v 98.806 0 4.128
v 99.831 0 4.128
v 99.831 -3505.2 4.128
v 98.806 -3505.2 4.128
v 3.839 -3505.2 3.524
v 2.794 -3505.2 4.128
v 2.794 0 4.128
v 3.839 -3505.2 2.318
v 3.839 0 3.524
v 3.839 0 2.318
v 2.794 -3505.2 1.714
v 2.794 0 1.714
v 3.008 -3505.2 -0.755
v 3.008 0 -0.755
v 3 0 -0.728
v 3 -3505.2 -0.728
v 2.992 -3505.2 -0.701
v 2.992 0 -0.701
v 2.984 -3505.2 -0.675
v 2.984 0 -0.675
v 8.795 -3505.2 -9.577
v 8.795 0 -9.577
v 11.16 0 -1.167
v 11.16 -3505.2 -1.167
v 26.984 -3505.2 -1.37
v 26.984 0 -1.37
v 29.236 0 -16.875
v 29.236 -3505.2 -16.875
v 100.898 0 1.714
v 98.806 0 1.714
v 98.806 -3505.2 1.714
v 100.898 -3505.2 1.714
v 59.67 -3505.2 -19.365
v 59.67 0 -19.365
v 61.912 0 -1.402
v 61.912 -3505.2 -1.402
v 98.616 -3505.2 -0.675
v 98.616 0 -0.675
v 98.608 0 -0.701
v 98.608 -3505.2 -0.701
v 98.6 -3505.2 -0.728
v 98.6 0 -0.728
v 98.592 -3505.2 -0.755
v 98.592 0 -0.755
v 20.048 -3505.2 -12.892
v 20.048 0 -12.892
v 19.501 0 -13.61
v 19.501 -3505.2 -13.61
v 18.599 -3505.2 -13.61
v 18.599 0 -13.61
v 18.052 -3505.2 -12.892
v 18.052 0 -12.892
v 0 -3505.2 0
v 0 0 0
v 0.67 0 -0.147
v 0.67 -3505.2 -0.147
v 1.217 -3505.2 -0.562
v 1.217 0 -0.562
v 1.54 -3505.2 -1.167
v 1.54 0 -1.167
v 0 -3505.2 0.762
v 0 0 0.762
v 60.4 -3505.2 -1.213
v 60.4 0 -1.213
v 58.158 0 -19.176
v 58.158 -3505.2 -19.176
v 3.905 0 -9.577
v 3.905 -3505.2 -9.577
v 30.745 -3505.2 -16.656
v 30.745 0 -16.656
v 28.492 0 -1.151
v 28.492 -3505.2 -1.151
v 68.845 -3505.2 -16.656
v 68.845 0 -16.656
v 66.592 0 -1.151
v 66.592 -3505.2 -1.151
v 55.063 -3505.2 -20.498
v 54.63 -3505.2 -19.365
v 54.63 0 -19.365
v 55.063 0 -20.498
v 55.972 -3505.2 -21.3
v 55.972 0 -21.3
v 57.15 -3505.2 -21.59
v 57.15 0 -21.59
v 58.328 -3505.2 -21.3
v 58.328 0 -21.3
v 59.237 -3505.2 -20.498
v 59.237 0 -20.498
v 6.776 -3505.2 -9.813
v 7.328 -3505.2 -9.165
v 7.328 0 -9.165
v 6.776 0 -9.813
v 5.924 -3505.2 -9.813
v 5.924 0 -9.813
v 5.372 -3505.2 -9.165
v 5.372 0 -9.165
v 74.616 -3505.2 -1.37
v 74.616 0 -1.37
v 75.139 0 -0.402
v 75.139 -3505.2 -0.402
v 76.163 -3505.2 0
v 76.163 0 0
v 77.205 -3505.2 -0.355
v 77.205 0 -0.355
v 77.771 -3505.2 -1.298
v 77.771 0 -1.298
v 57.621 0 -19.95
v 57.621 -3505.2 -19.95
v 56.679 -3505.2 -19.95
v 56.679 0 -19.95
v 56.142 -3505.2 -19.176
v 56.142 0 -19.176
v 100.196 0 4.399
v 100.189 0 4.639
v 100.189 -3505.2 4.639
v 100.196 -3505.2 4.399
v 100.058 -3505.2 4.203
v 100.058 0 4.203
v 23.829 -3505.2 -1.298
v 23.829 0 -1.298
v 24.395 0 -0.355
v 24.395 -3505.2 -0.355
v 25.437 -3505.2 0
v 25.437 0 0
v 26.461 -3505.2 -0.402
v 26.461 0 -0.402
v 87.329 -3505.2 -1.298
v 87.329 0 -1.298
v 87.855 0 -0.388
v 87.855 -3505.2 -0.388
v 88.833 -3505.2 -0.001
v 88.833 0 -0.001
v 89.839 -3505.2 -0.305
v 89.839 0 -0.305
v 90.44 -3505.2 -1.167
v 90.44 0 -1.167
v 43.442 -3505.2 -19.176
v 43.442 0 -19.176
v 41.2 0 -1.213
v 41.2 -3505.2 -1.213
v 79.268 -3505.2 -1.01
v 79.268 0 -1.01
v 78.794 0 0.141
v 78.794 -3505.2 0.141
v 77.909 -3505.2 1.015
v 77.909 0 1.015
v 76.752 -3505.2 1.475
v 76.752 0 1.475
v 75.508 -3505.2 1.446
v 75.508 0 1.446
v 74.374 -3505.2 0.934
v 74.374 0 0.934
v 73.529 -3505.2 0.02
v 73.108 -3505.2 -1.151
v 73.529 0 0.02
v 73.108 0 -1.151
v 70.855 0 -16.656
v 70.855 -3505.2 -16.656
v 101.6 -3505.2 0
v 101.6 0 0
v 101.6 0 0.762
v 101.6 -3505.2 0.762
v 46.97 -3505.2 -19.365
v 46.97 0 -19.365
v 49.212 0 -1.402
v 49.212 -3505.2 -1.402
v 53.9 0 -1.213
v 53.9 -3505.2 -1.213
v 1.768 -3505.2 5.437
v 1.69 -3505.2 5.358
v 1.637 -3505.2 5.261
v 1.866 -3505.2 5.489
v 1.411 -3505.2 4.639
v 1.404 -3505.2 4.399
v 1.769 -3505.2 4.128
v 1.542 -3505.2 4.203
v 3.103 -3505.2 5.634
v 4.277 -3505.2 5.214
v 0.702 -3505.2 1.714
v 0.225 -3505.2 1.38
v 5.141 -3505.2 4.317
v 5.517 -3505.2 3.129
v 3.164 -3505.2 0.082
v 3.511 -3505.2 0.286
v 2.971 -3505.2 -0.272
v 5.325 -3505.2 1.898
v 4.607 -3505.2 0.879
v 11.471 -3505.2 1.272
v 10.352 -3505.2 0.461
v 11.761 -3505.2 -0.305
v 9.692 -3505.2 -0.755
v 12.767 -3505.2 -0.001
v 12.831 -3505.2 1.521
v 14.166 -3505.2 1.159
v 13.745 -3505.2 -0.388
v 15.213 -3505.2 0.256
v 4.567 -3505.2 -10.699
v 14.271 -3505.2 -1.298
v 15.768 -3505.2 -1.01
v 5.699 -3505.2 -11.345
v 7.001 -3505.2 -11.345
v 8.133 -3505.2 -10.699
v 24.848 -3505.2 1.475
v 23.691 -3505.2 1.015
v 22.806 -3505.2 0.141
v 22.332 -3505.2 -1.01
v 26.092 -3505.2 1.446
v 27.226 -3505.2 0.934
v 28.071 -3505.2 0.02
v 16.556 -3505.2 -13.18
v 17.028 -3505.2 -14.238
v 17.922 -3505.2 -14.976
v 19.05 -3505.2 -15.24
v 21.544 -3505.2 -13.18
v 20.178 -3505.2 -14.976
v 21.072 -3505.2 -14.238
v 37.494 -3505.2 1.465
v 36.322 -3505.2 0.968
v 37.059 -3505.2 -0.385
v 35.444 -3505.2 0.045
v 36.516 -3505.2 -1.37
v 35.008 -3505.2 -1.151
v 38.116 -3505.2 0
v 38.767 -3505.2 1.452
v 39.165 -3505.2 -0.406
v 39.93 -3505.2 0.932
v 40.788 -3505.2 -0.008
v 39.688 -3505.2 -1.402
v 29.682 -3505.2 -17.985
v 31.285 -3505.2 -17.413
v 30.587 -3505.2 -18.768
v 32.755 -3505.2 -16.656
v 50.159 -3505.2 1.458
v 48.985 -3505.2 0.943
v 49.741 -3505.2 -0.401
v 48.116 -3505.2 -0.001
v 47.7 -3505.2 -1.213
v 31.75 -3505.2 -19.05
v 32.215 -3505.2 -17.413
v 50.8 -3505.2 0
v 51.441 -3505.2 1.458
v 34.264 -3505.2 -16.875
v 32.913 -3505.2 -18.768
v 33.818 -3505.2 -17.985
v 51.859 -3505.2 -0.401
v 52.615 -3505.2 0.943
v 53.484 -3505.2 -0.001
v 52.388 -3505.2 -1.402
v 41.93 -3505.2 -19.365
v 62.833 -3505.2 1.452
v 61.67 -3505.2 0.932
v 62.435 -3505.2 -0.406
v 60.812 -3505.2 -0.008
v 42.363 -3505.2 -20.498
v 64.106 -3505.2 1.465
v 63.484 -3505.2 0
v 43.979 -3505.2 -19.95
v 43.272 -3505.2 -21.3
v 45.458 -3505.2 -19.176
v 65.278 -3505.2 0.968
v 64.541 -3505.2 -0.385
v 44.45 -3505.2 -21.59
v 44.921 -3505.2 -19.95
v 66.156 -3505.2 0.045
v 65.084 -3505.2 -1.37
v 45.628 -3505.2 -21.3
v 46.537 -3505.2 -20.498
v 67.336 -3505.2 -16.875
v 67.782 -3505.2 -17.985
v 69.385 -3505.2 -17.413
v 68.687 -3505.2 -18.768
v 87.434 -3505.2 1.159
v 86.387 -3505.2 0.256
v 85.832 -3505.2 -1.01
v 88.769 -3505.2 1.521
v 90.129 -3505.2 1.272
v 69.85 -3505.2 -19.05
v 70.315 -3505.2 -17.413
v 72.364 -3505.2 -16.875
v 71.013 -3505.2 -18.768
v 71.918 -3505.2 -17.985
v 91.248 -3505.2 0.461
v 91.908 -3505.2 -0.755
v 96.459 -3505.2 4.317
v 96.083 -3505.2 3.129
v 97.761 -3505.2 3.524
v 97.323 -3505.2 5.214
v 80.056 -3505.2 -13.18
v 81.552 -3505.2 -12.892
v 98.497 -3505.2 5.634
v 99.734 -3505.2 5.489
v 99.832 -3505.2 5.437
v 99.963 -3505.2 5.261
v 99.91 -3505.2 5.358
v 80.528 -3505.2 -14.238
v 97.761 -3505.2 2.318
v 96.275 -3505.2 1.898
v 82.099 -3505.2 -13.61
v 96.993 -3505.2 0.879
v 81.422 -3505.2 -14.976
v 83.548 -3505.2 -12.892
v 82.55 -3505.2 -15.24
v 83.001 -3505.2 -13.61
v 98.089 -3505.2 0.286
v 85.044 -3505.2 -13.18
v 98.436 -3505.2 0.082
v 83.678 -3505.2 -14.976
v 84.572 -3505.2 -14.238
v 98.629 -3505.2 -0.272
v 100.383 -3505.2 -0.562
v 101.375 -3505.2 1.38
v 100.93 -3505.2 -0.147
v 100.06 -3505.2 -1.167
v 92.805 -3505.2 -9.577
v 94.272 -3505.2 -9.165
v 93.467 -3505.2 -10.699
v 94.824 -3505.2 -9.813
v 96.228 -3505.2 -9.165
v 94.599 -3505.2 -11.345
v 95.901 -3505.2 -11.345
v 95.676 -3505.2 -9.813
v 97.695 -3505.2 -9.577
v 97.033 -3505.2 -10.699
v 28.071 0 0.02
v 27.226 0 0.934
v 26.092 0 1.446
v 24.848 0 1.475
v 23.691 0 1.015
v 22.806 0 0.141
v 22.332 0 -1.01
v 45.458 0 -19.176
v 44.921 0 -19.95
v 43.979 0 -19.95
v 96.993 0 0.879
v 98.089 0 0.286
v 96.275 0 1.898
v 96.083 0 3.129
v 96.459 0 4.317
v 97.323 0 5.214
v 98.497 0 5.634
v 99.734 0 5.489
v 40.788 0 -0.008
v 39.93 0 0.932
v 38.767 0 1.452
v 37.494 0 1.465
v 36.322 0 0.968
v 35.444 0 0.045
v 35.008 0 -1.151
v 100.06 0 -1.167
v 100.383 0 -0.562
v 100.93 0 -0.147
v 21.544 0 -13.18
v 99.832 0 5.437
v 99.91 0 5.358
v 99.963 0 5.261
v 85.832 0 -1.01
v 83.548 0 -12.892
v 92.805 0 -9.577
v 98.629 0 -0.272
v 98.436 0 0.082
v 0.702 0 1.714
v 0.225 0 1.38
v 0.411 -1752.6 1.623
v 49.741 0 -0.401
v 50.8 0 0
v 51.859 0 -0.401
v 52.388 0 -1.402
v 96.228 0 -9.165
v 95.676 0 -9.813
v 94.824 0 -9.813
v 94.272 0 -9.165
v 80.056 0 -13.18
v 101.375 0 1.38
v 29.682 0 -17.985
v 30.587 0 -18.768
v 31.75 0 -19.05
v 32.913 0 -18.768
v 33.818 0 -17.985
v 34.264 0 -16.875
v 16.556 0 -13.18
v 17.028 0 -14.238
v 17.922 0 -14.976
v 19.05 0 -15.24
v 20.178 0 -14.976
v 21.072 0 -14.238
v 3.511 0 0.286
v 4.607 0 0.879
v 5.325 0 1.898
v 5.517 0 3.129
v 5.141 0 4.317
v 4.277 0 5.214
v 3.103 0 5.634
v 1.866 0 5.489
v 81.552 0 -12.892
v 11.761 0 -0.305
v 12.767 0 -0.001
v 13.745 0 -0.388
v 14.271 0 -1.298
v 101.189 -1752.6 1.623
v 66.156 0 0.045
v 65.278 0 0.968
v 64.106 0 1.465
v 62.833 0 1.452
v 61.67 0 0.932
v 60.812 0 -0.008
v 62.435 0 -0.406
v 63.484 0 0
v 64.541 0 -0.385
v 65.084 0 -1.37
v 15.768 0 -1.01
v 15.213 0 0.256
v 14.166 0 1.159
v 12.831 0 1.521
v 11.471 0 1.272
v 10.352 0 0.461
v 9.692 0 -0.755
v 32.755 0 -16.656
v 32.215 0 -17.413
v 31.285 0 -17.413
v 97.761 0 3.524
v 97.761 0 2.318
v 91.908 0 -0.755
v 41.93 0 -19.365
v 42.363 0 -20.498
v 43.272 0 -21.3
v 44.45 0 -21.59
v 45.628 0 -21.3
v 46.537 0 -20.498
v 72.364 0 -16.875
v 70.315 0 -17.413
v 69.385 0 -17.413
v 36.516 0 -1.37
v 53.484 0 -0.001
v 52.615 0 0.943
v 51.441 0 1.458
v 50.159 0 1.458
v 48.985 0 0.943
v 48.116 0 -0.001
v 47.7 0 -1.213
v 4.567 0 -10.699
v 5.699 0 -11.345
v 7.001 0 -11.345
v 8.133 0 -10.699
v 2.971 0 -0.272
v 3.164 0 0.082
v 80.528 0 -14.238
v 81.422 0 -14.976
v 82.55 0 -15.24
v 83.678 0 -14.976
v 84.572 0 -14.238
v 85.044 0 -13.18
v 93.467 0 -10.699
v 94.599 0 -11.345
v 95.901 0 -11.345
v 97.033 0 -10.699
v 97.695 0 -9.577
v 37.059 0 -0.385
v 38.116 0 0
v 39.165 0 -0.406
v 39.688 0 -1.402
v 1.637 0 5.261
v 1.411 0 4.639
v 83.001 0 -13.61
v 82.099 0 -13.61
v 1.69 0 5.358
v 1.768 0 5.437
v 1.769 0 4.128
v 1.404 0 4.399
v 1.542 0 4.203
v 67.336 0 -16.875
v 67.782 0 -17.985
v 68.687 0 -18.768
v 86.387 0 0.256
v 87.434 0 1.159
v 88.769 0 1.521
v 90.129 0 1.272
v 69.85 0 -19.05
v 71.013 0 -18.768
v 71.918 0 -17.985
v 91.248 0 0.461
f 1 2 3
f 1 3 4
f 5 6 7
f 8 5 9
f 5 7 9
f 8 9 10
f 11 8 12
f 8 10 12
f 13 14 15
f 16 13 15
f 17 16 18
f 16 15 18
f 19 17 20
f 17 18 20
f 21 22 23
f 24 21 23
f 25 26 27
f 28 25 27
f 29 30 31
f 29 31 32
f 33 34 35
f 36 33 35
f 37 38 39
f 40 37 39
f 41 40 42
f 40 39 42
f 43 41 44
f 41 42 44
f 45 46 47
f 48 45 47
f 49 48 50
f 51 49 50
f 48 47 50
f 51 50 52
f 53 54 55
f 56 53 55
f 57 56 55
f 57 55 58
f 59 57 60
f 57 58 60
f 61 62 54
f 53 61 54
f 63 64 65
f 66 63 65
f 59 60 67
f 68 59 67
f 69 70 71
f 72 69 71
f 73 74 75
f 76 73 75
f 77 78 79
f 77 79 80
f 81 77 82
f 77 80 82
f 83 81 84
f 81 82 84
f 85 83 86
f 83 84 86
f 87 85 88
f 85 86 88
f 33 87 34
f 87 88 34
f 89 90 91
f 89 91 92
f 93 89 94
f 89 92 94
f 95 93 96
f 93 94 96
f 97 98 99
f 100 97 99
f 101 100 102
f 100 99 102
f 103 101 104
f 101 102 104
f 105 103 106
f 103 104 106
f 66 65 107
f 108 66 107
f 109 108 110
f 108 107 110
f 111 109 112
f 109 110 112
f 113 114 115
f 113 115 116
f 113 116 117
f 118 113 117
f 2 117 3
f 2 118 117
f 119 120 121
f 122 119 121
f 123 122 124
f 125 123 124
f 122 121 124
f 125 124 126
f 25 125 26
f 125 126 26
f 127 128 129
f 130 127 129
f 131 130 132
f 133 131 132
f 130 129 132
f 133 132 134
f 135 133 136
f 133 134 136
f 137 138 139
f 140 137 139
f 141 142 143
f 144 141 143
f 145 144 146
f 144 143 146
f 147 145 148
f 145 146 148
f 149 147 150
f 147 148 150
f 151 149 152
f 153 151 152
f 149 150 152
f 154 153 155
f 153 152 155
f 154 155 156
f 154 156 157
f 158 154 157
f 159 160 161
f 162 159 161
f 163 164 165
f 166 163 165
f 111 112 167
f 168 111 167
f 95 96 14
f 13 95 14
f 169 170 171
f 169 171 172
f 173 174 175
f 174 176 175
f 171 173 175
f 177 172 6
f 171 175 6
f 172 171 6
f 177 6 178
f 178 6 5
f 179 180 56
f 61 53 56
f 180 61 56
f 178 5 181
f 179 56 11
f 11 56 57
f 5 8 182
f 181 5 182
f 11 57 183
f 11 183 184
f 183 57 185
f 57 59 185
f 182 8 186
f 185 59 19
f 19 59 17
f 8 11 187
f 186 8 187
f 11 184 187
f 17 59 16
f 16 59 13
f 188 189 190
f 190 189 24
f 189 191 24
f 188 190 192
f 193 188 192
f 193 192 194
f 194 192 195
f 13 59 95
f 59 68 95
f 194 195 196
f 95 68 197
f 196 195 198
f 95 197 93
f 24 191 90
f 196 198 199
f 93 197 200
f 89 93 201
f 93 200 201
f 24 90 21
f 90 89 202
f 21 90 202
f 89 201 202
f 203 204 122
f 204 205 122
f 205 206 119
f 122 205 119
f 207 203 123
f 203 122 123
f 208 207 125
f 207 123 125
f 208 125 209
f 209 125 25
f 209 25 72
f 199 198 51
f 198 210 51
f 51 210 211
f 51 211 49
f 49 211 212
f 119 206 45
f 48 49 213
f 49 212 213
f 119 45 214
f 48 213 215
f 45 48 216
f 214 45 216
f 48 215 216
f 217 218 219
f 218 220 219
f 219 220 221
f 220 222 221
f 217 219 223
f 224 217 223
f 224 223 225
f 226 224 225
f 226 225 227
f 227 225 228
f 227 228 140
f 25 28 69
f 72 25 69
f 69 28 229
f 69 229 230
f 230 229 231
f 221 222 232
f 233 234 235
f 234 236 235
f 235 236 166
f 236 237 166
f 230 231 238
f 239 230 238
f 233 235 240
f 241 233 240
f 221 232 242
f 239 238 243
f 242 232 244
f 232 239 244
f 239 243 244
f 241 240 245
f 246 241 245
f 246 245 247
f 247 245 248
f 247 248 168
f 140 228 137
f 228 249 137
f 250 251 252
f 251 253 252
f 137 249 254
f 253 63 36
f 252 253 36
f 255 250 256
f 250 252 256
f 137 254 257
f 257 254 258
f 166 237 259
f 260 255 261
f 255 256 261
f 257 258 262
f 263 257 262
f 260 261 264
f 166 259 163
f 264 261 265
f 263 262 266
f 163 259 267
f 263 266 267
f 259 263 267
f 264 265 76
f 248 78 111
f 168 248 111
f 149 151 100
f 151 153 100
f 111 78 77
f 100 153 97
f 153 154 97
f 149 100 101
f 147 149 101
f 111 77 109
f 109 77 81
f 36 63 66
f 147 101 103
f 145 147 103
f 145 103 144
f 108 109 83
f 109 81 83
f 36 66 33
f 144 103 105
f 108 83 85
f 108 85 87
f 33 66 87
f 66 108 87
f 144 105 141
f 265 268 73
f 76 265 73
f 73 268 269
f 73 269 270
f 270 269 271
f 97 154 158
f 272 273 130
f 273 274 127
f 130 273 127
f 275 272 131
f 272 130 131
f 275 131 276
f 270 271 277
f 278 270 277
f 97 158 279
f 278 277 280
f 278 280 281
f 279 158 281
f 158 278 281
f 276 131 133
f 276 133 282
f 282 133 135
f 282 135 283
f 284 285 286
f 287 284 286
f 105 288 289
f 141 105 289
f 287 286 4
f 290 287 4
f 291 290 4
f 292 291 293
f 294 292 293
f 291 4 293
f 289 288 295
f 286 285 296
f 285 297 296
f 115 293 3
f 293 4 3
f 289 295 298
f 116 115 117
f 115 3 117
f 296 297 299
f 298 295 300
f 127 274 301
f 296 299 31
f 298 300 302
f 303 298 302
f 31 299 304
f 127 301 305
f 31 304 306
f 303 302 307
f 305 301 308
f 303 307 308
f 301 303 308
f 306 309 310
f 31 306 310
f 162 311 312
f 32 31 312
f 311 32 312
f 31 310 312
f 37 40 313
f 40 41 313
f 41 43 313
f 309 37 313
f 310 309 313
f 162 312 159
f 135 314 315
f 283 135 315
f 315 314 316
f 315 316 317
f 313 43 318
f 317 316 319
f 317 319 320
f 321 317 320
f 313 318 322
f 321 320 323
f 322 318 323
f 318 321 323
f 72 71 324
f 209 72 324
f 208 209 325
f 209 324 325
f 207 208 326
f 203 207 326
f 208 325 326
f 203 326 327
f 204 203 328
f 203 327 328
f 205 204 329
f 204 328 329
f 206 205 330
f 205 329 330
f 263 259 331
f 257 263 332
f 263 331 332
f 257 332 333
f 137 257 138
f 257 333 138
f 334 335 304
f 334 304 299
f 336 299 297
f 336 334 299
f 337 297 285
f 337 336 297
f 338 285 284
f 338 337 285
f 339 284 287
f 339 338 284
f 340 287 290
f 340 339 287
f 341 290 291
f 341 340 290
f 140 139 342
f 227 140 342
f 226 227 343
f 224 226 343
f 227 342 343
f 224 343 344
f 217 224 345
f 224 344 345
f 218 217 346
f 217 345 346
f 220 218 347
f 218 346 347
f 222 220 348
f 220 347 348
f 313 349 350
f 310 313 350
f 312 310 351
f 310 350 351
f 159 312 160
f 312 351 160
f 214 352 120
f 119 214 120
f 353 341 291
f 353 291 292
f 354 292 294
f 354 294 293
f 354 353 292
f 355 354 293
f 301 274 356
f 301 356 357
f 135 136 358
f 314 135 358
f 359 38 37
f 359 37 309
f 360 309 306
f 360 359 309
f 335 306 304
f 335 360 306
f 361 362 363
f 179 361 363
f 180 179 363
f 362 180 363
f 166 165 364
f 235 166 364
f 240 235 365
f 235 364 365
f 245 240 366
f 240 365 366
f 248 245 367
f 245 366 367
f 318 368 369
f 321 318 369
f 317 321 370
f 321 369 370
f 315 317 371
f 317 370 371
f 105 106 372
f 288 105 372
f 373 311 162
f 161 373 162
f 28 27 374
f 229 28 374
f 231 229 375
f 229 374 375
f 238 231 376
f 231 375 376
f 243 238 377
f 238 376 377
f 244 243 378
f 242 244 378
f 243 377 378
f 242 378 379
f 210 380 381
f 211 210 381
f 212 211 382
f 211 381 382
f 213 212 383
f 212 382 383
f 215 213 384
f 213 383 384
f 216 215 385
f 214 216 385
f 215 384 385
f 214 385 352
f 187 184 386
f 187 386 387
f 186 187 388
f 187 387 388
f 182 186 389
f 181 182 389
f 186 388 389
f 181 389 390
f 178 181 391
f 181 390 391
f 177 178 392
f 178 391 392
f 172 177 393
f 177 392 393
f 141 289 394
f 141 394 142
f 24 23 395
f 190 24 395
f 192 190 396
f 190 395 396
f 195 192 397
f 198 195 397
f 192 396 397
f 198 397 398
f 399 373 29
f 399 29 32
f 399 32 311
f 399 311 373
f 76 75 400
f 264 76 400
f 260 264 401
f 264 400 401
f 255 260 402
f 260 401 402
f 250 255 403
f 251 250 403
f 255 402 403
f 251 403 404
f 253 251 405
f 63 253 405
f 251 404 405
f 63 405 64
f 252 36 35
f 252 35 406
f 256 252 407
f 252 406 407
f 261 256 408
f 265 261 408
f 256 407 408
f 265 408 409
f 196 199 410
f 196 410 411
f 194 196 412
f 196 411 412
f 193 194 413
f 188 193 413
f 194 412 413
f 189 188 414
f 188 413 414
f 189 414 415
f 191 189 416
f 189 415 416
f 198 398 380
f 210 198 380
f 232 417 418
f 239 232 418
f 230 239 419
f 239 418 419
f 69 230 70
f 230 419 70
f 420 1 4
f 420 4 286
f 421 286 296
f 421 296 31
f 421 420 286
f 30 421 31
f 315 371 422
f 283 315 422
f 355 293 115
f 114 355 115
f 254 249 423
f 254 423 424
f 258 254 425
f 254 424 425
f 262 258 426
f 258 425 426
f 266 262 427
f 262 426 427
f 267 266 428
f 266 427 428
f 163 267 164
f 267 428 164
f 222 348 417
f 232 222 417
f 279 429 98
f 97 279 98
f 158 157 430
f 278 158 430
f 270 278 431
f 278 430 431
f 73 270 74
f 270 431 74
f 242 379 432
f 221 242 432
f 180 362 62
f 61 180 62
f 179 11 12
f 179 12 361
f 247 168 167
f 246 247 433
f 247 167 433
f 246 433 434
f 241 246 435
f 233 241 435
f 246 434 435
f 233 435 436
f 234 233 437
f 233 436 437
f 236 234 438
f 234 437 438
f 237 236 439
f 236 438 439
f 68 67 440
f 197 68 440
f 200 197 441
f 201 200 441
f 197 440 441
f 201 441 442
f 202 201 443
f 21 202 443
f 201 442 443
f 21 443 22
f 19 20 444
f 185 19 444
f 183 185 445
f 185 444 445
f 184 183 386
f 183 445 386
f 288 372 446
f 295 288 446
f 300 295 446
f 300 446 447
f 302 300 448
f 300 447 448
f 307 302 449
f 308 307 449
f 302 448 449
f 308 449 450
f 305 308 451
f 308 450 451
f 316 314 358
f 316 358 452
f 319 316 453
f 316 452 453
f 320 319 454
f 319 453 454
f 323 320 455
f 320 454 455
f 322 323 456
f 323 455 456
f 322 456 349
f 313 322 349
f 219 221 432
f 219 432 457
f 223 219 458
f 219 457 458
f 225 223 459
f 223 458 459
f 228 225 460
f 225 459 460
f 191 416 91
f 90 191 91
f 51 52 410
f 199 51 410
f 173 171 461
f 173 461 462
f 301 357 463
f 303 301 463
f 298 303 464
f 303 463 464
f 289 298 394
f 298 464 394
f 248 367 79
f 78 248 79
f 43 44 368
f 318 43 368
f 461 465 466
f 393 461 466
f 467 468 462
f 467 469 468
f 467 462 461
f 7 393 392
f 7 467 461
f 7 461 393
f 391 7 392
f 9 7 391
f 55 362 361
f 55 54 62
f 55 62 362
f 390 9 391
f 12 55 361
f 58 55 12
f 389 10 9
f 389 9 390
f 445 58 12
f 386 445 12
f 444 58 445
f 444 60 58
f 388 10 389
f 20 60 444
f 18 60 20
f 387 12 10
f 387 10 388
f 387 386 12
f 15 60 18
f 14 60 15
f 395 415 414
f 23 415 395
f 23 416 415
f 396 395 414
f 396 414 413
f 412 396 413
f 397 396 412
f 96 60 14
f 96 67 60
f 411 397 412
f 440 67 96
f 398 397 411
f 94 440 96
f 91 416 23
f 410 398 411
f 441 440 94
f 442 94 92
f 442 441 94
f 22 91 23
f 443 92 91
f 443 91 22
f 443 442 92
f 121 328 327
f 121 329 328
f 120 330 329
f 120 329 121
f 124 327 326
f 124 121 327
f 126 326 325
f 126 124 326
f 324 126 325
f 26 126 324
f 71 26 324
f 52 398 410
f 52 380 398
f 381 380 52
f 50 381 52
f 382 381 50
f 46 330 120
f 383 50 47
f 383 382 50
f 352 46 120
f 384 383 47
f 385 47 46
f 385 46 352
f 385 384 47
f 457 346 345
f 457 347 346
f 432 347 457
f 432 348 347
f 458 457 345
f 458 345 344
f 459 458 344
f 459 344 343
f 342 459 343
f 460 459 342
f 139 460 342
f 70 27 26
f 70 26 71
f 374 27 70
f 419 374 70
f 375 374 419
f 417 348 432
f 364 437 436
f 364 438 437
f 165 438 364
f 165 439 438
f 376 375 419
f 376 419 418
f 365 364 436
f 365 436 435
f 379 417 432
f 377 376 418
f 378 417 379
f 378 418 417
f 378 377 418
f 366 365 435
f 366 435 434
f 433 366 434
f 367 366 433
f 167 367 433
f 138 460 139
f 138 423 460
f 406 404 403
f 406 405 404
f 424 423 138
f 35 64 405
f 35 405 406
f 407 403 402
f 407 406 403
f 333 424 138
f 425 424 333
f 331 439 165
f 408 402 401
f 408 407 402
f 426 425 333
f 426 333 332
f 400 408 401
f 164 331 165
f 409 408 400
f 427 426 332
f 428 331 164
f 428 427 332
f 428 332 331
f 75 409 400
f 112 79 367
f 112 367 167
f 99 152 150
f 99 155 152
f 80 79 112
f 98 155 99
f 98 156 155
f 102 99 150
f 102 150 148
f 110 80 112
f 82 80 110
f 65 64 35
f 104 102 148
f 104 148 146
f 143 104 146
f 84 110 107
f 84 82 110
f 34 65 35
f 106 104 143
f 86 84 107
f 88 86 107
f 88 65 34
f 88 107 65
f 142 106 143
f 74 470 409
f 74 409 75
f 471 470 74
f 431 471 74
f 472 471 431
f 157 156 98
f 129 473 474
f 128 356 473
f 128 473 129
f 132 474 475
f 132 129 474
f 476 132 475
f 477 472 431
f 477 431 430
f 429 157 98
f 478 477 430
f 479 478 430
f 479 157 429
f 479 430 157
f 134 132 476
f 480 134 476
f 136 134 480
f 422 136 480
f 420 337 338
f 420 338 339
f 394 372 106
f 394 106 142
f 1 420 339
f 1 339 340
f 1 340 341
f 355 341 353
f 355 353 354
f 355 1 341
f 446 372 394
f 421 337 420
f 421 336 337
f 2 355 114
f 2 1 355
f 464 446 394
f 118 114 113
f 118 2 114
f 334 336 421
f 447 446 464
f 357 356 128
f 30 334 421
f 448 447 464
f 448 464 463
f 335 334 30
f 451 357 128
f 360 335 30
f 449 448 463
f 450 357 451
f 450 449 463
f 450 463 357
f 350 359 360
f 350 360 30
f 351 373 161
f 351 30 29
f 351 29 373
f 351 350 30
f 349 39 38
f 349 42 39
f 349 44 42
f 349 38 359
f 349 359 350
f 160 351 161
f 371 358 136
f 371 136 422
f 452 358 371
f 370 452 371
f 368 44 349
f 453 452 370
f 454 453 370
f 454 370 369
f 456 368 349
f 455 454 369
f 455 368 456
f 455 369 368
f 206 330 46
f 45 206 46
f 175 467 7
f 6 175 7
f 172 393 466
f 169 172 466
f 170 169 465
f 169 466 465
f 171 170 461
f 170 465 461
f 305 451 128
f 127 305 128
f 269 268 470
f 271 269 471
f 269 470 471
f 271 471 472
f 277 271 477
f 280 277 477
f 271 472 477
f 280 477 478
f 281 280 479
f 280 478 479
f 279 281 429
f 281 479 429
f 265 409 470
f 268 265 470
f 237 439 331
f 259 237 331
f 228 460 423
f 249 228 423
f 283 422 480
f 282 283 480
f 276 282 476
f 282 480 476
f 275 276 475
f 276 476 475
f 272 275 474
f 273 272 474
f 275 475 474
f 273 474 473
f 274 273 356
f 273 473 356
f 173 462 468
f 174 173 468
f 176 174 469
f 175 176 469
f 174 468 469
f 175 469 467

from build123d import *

# Parameters (mm, degrees)
BOSS_EXTRUDE1_DEPTH = 3505.2
CUT_EXTRUDE1_DEPTH  = 3506.2
BOSS_EXTRUDE2_DEPTH = 3505.2
FILLET1_R           = 0.508


with BuildPart() as part:
    # Sketch1 → Boss-Extrude1 (new body)
    with BuildSketch(Plane(origin=(0, 0, 0), x_dir=(1, 0, 0), z_dir=(0, 1, 0))):
        with BuildLine():
            Line((1.540485976, 1.167137652), (3.904784165, 9.577400553))
            ThreePointArc((3.904784165, 9.577400553), (6.35, 11.43), (8.795215835, 9.577400553))
            Line((8.795215835, 9.577400553), (11.159514024, 1.167137652))
            ThreePointArc((11.159514024, 1.167137652), (12.767277455, 0.001414904), (14.271422384, 1.298087881))
            Line((14.271422384, 1.298087881), (16.555678756, 13.179543046))
            ThreePointArc((16.555678756, 13.179543046), (19.05, 15.24), (21.544321244, 13.179543046))
            Line((21.544321244, 13.179543046), (23.828577616, 1.298087881))
            ThreePointArc((23.828577616, 1.298087881), (25.436521885, 0.00041683), (26.983572077, 1.370114107))
            Line((26.983572077, 1.370114107), (29.236393529, 16.875215703))
            ThreePointArc((29.236393529, 16.875215703), (31.75, 19.05), (34.263606471, 16.875215703))
            Line((34.263606471, 16.875215703), (36.516427923, 1.370114107))
            ThreePointArc((36.516427923, 1.370114107), (38.116106242, 8.1058e-05), (39.687882683, 1.40203687))
            Line((39.687882683, 1.40203687), (41.929551297, 19.364544652))
            ThreePointArc((41.929551297, 19.364544652), (44.45, 21.59), (46.970448703, 19.364544652))
            Line((46.970448703, 19.364544652), (49.212117317, 1.40203687))
            ThreePointArc((49.212117317, 1.40203687), (50.8, 0), (52.387882683, 1.40203687))
            Line((52.387882683, 1.40203687), (54.629551297, 19.364544652))
            ThreePointArc((54.629551297, 19.364544652), (57.15, 21.59), (59.670448703, 19.364544652))
            Line((59.670448703, 19.364544652), (61.912117317, 1.40203687))
            ThreePointArc((61.912117317, 1.40203687), (63.483893758, 8.1058e-05), (65.083572077, 1.370114107))
            Line((65.083572077, 1.370114107), (67.336393529, 16.875215703))
            ThreePointArc((67.336393529, 16.875215703), (69.85, 19.05), (72.363606471, 16.875215703))
            Line((72.363606471, 16.875215703), (74.616427923, 1.370114107))
            ThreePointArc((74.616427923, 1.370114107), (76.163478115, 0.00041683), (77.771422384, 1.298087881))
            Line((77.771422384, 1.298087881), (80.055678756, 13.179543046))
            ThreePointArc((80.055678756, 13.179543046), (82.55, 15.24), (85.044321244, 13.179543046))
            Line((85.044321244, 13.179543046), (87.328577616, 1.298087881))
            ThreePointArc((87.328577616, 1.298087881), (88.832722545, 0.001414904), (90.440485976, 1.167137652))
            Line((90.440485976, 1.167137652), (92.804784165, 9.577400553))
            ThreePointArc((92.804784165, 9.577400553), (95.25, 11.43), (97.695215835, 9.577400553))
            Line((97.695215835, 9.577400553), (100.059514024, 1.167137652))
            ThreePointArc((100.059514024, 1.167137652), (100.633652839, 0.324734122), (101.6, 0))
            Line((101.6, 0), (101.6, -1.524))
            ThreePointArc((101.6, -1.524), (99.71332221, -0.889995285), (98.592384523, 0.75469732))
            Line((98.592384523, 0.75469732), (96.228086334, 9.164960221))
            ThreePointArc((96.228086334, 9.164960221), (95.25, 9.906), (94.271913666, 9.164960221))
            Line((94.271913666, 9.164960221), (91.907615477, 0.75469732))
            ThreePointArc((91.907615477, 0.75469732), (88.768648778, -1.521237569), (85.83198487, 1.010362054))
            Line((85.83198487, 1.010362054), (83.547728498, 12.891817218))
            ThreePointArc((83.547728498, 12.891817218), (82.55, 13.716), (81.552271502, 12.891817218))
            Line((81.552271502, 12.891817218), (79.26801513, 1.010362054))
            ThreePointArc((79.26801513, 1.010362054), (76.128695368, -1.52318619), (73.108264041, 1.150984685))
            Line((73.108264041, 1.150984685), (70.855442588, 16.656086281))
            ThreePointArc((70.855442588, 16.656086281), (69.85, 17.526), (68.844557412, 16.656086281))
            Line((68.844557412, 16.656086281), (66.591735959, 1.150984685))
            ThreePointArc((66.591735959, 1.150984685), (63.468554481, -1.523841744), (60.399848096, 1.213310079))
            Line((60.399848096, 1.213310079), (58.158179481, 19.175817861))
            ThreePointArc((58.158179481, 19.175817861), (57.15, 20.066), (56.141820519, 19.175817861))
            Line((56.141820519, 19.175817861), (53.900151904, 1.213310079))
            ThreePointArc((53.900151904, 1.213310079), (50.8, -1.524), (47.699848096, 1.213310079))
            Line((47.699848096, 1.213310079), (45.458179481, 19.175817861))
            ThreePointArc((45.458179481, 19.175817861), (44.45, 20.066), (43.441820519, 19.175817861))
            Line((43.441820519, 19.175817861), (41.200151904, 1.213310079))
            ThreePointArc((41.200151904, 1.213310079), (38.131445519, -1.523841744), (35.008264041, 1.150984685))
            Line((35.008264041, 1.150984685), (32.755442588, 16.656086281))
            ThreePointArc((32.755442588, 16.656086281), (31.75, 17.526), (30.744557412, 16.656086281))
            Line((30.744557412, 16.656086281), (28.491735959, 1.150984685))
            ThreePointArc((28.491735959, 1.150984685), (25.471304632, -1.52318619), (22.33198487, 1.010362054))
            Line((22.33198487, 1.010362054), (20.047728498, 12.891817218))
            ThreePointArc((20.047728498, 12.891817218), (19.05, 13.716), (18.052271502, 12.891817218))
            Line((18.052271502, 12.891817218), (15.76801513, 1.010362054))
            ThreePointArc((15.76801513, 1.010362054), (12.831351222, -1.521237569), (9.692384523, 0.75469732))
            Line((9.692384523, 0.75469732), (7.328086334, 9.164960221))
            ThreePointArc((7.328086334, 9.164960221), (6.35, 9.906), (5.371913666, 9.164960221))
            Line((5.371913666, 9.164960221), (3.007615477, 0.75469732))
            ThreePointArc((3.007615477, 0.75469732), (1.88667779, -0.889995285), (0, -1.524))
            Line((0, -1.524), (0, 0))
            ThreePointArc((0, 0), (0.966347161, 0.324734122), (1.540485976, 1.167137652))
        make_face()
    extrude(amount=-BOSS_EXTRUDE1_DEPTH)

    # Sketch2 → Cut-Extrude1 (cut, through all)
    with BuildSketch(Plane(origin=(0, 0, 0), x_dir=(1, 0, 0), z_dir=(0, 1, 0))):
        Polygon((0, -0.762), (0, -1.524), (0.277345319, -1.524), align=None)
        Polygon((101.6, -0.762), (101.6, -1.524), (101.322654681, -1.524), align=None)
    extrude(amount=-CUT_EXTRUDE1_DEPTH, mode=Mode.SUBTRACT)

    # Sketch3 → Boss-Extrude2 (add, through all)
    with BuildSketch(Plane(origin=(0, 0, 0), x_dir=(1, 0, 0), z_dir=(0, 1, 0))):
        with BuildLine():
            Line((101.253318352, -1.7145), (101.327004192, -1.512049818))
            ThreePointArc((101.327004192, -1.512049818), (99.638578579, -0.831558962), (98.61607894, 0.674543074))
            ThreePointArc((98.61607894, 0.674543074), (98.556259483, 0.082078125), (98.088520228, -0.286450128))
            ThreePointArc((98.088520228, -0.286450128), (96.202609275, -3.74439965), (99.733973274, -5.488975049))
            ThreePointArc((99.733973274, -5.488975049), (99.873585853, -5.400370737), (99.96251152, -5.260962624))
            Line((99.96251152, -5.260962624), (100.188956675, -4.638809675))
            ThreePointArc((100.188956675, -4.638809675), (100.143030715, -4.289967378), (99.830933786, -4.1275))
            Line((99.830933786, -4.1275), (98.806, -4.1275))
            ThreePointArc((98.806, -4.1275), (97.5995, -2.921), (98.806, -1.7145))
            Line((98.806, -1.7145), (101.253318352, -1.7145))
        make_face()
        with BuildLine():
            Line((1.63748848, -5.260962624), (1.411043325, -4.638809675))
            ThreePointArc((1.411043325, -4.638809675), (1.456969285, -4.289967378), (1.769066214, -4.1275))
            Line((1.769066214, -4.1275), (2.794, -4.1275))
            ThreePointArc((2.794, -4.1275), (4.0005, -2.921), (2.794, -1.7145))
            Line((2.794, -1.7145), (0.346681648, -1.7145))
            Line((0.346681648, -1.7145), (0.272995808, -1.512049818))
            ThreePointArc((0.272995808, -1.512049818), (1.961421421, -0.831558962), (2.98392106, 0.674543074))
            ThreePointArc((2.98392106, 0.674543074), (3.043740517, 0.082078125), (3.511479772, -0.286450128))
            ThreePointArc((3.511479772, -0.286450128), (5.397390725, -3.74439965), (1.866026726, -5.488975049))
            ThreePointArc((1.866026726, -5.488975049), (1.726414147, -5.400370737), (1.63748848, -5.260962624))
        make_face()
    extrude(amount=-BOSS_EXTRUDE2_DEPTH)

    # Fillet1
    fillet1_edges = [part.edges().sort_by_distance(p)[0] for p in [
        (0.346681648, -1752.6, 1.7145),
        (101.253318352, -1752.6, 1.7145),
    ]]
    fillet(fillet1_edges, radius=FILLET1_R)


solid = part.part
